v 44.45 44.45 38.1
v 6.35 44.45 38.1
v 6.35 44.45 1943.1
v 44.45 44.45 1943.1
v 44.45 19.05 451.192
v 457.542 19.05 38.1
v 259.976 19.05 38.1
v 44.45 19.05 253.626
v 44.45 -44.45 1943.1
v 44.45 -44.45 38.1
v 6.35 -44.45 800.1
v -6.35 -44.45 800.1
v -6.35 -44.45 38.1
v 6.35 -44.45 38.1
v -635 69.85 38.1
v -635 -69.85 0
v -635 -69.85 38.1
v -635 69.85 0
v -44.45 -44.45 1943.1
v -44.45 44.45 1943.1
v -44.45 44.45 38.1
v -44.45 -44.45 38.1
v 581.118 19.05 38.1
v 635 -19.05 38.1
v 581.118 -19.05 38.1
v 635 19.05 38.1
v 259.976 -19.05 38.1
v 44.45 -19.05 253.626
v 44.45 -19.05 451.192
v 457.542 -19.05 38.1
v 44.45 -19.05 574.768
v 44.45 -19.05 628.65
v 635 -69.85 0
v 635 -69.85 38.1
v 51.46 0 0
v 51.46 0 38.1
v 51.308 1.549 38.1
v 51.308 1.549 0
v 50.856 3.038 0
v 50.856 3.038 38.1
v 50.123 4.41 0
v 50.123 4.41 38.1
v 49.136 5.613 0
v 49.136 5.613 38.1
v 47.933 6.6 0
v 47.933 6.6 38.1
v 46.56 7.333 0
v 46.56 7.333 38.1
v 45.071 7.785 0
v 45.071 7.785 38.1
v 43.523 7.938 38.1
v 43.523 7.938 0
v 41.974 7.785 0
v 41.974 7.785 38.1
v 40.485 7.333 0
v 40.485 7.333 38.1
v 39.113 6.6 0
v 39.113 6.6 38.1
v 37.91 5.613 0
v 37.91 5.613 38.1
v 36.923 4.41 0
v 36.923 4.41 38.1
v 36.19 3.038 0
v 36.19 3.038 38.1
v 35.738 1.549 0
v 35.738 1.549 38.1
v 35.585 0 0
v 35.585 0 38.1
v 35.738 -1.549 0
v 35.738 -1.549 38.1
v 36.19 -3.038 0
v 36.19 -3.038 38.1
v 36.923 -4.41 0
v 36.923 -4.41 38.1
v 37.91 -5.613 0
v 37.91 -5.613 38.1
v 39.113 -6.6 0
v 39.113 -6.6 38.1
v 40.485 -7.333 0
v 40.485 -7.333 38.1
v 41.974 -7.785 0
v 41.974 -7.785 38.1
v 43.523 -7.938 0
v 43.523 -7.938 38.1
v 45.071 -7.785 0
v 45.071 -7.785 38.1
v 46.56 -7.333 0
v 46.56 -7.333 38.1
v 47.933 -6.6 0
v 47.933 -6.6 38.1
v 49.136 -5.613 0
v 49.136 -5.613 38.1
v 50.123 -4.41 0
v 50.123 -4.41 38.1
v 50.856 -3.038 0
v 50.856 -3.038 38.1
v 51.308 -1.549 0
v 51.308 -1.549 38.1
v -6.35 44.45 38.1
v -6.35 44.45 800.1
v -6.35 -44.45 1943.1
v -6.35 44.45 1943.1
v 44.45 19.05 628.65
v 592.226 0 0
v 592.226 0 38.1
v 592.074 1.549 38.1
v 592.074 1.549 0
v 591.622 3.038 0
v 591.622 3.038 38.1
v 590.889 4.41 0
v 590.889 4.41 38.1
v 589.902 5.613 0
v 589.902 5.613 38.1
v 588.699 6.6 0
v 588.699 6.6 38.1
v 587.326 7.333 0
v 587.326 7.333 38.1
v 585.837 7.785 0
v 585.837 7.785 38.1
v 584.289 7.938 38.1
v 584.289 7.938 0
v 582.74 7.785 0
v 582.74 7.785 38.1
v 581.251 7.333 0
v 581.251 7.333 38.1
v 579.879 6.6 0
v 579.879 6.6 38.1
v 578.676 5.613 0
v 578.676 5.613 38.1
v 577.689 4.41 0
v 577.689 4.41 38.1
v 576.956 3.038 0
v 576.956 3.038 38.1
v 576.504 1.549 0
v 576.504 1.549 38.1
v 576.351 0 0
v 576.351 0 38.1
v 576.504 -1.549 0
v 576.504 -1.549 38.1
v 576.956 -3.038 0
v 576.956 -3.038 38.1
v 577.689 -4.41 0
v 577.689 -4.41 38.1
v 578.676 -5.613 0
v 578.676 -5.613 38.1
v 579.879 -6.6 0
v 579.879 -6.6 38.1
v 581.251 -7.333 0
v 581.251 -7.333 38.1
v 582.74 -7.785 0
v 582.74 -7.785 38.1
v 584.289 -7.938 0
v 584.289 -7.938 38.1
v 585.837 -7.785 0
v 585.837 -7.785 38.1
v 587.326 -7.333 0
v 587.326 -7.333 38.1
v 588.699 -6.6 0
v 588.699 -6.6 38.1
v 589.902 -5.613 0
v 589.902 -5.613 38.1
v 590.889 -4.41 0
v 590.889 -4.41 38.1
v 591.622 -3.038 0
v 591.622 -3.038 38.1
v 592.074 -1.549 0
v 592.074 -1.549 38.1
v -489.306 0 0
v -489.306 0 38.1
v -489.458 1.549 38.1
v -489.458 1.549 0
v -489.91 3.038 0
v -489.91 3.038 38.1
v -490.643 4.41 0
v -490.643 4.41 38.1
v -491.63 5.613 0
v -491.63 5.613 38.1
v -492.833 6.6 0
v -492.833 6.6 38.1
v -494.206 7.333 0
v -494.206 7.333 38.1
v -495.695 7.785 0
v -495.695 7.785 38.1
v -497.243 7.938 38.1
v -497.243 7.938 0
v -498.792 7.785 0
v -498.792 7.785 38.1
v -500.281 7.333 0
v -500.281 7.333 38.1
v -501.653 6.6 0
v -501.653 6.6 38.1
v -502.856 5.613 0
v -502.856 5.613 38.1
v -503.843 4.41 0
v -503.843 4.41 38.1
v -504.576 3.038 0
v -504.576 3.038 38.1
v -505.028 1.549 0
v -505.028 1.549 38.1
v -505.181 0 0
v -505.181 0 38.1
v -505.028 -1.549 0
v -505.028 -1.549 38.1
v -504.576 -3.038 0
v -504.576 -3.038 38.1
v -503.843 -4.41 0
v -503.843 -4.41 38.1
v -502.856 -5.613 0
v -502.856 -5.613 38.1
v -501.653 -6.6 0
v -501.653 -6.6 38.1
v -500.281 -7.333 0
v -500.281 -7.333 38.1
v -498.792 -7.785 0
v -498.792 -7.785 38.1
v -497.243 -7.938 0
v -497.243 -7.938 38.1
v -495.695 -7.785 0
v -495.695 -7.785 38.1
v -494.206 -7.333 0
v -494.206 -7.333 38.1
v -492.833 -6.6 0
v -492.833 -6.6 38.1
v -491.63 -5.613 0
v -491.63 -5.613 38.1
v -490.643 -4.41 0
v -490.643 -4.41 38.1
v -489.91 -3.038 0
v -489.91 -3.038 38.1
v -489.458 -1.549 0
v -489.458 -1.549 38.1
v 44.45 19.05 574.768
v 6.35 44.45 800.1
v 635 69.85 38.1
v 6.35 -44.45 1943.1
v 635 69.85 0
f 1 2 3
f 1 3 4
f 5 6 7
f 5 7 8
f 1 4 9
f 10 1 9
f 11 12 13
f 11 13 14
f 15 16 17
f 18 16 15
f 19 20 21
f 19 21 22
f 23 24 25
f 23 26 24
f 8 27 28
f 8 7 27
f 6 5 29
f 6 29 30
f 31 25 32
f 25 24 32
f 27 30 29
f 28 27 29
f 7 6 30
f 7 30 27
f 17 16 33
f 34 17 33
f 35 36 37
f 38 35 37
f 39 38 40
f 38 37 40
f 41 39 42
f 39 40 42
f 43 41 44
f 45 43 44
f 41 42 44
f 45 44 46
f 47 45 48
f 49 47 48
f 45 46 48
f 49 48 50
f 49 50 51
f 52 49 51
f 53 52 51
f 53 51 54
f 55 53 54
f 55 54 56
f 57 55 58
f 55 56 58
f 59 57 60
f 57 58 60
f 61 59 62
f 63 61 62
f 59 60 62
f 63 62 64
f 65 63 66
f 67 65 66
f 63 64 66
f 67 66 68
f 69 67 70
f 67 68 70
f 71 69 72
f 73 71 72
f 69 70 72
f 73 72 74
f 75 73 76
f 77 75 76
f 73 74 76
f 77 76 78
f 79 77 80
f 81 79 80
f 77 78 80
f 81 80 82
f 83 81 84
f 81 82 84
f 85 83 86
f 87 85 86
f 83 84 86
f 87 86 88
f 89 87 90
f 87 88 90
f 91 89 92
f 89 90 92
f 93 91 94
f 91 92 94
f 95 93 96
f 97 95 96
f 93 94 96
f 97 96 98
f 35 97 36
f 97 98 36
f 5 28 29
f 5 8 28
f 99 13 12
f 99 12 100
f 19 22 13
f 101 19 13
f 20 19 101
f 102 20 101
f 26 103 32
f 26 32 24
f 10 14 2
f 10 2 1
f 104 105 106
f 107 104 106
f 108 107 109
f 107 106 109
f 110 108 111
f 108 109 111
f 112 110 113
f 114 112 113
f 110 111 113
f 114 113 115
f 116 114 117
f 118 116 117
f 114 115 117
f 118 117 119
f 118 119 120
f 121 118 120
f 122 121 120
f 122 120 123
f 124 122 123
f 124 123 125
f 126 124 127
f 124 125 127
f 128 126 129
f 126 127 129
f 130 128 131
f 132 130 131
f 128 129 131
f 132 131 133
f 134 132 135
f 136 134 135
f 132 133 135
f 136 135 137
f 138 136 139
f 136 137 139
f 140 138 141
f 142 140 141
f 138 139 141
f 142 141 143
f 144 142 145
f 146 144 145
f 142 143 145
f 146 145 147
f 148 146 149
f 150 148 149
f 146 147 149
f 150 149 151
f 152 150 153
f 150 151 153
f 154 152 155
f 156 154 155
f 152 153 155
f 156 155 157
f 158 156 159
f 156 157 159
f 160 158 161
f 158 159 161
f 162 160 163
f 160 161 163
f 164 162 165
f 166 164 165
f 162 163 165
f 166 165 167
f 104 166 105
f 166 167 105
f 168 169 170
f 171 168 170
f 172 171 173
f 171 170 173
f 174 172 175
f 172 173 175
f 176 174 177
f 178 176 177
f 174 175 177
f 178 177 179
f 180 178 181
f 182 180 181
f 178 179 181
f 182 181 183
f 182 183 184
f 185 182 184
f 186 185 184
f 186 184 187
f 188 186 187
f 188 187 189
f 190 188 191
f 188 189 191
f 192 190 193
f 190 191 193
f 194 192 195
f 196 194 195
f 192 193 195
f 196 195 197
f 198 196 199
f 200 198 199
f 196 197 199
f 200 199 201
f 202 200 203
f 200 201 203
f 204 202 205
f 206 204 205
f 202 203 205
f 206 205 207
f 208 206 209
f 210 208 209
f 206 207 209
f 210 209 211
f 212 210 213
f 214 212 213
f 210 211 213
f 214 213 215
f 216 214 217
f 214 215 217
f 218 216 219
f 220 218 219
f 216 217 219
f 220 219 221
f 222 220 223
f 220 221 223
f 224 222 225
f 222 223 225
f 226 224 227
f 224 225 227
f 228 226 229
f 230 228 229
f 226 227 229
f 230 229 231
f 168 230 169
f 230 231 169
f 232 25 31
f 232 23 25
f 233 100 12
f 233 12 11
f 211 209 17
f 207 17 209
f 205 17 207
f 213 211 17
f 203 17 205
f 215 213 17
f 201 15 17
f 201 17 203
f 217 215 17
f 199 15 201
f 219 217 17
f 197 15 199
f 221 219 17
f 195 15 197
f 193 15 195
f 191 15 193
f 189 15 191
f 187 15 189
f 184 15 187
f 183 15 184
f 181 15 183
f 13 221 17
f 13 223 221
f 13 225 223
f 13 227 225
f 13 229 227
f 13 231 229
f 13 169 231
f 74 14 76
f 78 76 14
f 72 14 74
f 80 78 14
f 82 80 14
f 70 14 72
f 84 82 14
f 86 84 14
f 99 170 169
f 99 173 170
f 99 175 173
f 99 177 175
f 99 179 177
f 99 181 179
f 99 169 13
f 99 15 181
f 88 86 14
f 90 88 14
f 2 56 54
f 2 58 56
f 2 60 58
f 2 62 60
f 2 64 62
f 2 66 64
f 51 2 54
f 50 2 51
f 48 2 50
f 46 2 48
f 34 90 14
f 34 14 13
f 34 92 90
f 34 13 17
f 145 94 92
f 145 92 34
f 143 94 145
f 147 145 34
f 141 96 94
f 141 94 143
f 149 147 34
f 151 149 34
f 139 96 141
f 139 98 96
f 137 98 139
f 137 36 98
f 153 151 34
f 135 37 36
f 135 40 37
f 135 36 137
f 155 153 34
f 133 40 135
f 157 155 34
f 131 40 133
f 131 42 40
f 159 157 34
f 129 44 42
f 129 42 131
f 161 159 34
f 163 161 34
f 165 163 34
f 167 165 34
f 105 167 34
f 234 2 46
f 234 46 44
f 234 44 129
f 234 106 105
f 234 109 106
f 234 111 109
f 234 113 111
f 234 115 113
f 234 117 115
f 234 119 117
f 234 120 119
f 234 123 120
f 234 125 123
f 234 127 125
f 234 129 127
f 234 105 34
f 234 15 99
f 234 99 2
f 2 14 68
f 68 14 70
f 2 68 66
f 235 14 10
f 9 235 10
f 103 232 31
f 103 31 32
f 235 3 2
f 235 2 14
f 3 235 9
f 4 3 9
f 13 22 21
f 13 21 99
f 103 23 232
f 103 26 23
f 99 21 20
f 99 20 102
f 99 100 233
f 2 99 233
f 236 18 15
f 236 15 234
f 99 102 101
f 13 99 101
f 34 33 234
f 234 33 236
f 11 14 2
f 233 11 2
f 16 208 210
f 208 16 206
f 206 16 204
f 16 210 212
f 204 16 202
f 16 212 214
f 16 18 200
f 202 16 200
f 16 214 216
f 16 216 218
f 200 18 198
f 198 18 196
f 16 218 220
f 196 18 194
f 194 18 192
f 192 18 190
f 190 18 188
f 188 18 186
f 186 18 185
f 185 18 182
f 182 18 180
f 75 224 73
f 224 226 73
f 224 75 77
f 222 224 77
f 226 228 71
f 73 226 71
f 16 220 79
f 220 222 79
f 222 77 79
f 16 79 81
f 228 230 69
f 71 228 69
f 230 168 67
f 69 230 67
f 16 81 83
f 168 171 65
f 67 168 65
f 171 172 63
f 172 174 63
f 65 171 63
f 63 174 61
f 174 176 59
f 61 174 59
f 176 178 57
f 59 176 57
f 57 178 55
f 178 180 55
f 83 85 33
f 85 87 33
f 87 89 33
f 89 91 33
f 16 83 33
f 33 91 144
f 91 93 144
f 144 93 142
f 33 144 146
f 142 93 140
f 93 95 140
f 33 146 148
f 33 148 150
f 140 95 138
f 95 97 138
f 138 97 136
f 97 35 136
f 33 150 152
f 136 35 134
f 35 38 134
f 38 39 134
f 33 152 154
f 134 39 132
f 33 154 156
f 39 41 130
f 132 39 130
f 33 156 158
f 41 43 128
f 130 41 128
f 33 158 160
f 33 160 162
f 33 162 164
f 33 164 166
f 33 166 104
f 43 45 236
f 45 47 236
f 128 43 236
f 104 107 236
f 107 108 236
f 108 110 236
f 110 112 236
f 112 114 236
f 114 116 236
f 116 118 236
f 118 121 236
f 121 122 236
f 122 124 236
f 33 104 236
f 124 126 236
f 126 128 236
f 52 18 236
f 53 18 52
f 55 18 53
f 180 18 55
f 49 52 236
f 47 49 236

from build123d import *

# Parameters (mm, degrees)
F0_W      = 1270
F0_H      = 139.7
F1_DEPTH  = 38.1
F2_R      = 7.9375
F3_DEPTH  = 38.1
F4_W      = 12.7
F4_H      = 88.9
F5_DEPTH  = 762
F7_W      = 38.1
F7_H      = 88.9
F8_DEPTH  = 1905
F14_DEPTH = 19.05
F16_DEPTH = 19.05


with BuildPart() as f1:
    # F0 (on Top) → F1 (new body)
    with BuildSketch(Plane.XY):
        Rectangle(F0_W, F0_H)
    extrude(amount=F1_DEPTH)

    # F2 (on face) → F3 (cut, through all)
    with BuildSketch(Plane.XY.offset(38.1)):
        with Locations((-497.2431, 0)):
            Circle(F2_R)
        with Locations((43.5229, 0)):
            Circle(F2_R)
        with Locations((584.2889, 0)):
            Circle(F2_R)
    extrude(amount=-F3_DEPTH, mode=Mode.SUBTRACT)

    # F4 (on face) → F5 (join)
    with BuildSketch(Plane.XY.offset(38.1)):
        Rectangle(F4_W, F4_H)
    extrude(amount=F5_DEPTH)


with BuildPart() as f8:
    # F7 (on 3pt) → F8 (new body)
    with BuildSketch(Plane(origin=(0, 0, 38.1), x_dir=(1, 0, 0), z_dir=(0, 0, -1))):
        with Locations((25.4, 0)):
            Rectangle(F7_W, F7_H)
    extrude(amount=-F8_DEPTH)


with BuildPart() as f8b:
    # F7 (on 3pt) → F8, piece 2 (new body)
    with BuildSketch(Plane(origin=(0, 0, 38.1), x_dir=(1, 0, 0), z_dir=(0, 0, -1))):
        with Locations((-25.4, 0)):
            Rectangle(F7_W, F7_H)
    extrude(amount=-F8_DEPTH)


with BuildPart() as f14:
    # F13 (on 3pt) → F14 (new body, symmetric)
    with BuildSketch(Plane(origin=(0, 0, 0), x_dir=(-1, 0, 0), z_dir=(0, 1, 0))):
        Polygon((-581.1184632736, 38.1), (-44.45, 574.7684632736), (-44.45, 628.65), (-635, 38.1), align=None)
    extrude(amount=F14_DEPTH, both=True)


with BuildPart() as f16:
    # F15 (on 3pt) → F16 (new body, symmetric)
    with BuildSketch(Plane(origin=(0, 0, 0), x_dir=(-1, 0, 0), z_dir=(0, 1, 0))):
        Polygon((-44.45, 253.6261469057), (-44.45, 451.1917815692), (-457.5417815692, 38.1), (-259.9761469057, 38.1), align=None)
    extrude(amount=F16_DEPTH, both=True)


solid = Compound([f1.part, f8.part, f8b.part, f14.part, f16.part])
